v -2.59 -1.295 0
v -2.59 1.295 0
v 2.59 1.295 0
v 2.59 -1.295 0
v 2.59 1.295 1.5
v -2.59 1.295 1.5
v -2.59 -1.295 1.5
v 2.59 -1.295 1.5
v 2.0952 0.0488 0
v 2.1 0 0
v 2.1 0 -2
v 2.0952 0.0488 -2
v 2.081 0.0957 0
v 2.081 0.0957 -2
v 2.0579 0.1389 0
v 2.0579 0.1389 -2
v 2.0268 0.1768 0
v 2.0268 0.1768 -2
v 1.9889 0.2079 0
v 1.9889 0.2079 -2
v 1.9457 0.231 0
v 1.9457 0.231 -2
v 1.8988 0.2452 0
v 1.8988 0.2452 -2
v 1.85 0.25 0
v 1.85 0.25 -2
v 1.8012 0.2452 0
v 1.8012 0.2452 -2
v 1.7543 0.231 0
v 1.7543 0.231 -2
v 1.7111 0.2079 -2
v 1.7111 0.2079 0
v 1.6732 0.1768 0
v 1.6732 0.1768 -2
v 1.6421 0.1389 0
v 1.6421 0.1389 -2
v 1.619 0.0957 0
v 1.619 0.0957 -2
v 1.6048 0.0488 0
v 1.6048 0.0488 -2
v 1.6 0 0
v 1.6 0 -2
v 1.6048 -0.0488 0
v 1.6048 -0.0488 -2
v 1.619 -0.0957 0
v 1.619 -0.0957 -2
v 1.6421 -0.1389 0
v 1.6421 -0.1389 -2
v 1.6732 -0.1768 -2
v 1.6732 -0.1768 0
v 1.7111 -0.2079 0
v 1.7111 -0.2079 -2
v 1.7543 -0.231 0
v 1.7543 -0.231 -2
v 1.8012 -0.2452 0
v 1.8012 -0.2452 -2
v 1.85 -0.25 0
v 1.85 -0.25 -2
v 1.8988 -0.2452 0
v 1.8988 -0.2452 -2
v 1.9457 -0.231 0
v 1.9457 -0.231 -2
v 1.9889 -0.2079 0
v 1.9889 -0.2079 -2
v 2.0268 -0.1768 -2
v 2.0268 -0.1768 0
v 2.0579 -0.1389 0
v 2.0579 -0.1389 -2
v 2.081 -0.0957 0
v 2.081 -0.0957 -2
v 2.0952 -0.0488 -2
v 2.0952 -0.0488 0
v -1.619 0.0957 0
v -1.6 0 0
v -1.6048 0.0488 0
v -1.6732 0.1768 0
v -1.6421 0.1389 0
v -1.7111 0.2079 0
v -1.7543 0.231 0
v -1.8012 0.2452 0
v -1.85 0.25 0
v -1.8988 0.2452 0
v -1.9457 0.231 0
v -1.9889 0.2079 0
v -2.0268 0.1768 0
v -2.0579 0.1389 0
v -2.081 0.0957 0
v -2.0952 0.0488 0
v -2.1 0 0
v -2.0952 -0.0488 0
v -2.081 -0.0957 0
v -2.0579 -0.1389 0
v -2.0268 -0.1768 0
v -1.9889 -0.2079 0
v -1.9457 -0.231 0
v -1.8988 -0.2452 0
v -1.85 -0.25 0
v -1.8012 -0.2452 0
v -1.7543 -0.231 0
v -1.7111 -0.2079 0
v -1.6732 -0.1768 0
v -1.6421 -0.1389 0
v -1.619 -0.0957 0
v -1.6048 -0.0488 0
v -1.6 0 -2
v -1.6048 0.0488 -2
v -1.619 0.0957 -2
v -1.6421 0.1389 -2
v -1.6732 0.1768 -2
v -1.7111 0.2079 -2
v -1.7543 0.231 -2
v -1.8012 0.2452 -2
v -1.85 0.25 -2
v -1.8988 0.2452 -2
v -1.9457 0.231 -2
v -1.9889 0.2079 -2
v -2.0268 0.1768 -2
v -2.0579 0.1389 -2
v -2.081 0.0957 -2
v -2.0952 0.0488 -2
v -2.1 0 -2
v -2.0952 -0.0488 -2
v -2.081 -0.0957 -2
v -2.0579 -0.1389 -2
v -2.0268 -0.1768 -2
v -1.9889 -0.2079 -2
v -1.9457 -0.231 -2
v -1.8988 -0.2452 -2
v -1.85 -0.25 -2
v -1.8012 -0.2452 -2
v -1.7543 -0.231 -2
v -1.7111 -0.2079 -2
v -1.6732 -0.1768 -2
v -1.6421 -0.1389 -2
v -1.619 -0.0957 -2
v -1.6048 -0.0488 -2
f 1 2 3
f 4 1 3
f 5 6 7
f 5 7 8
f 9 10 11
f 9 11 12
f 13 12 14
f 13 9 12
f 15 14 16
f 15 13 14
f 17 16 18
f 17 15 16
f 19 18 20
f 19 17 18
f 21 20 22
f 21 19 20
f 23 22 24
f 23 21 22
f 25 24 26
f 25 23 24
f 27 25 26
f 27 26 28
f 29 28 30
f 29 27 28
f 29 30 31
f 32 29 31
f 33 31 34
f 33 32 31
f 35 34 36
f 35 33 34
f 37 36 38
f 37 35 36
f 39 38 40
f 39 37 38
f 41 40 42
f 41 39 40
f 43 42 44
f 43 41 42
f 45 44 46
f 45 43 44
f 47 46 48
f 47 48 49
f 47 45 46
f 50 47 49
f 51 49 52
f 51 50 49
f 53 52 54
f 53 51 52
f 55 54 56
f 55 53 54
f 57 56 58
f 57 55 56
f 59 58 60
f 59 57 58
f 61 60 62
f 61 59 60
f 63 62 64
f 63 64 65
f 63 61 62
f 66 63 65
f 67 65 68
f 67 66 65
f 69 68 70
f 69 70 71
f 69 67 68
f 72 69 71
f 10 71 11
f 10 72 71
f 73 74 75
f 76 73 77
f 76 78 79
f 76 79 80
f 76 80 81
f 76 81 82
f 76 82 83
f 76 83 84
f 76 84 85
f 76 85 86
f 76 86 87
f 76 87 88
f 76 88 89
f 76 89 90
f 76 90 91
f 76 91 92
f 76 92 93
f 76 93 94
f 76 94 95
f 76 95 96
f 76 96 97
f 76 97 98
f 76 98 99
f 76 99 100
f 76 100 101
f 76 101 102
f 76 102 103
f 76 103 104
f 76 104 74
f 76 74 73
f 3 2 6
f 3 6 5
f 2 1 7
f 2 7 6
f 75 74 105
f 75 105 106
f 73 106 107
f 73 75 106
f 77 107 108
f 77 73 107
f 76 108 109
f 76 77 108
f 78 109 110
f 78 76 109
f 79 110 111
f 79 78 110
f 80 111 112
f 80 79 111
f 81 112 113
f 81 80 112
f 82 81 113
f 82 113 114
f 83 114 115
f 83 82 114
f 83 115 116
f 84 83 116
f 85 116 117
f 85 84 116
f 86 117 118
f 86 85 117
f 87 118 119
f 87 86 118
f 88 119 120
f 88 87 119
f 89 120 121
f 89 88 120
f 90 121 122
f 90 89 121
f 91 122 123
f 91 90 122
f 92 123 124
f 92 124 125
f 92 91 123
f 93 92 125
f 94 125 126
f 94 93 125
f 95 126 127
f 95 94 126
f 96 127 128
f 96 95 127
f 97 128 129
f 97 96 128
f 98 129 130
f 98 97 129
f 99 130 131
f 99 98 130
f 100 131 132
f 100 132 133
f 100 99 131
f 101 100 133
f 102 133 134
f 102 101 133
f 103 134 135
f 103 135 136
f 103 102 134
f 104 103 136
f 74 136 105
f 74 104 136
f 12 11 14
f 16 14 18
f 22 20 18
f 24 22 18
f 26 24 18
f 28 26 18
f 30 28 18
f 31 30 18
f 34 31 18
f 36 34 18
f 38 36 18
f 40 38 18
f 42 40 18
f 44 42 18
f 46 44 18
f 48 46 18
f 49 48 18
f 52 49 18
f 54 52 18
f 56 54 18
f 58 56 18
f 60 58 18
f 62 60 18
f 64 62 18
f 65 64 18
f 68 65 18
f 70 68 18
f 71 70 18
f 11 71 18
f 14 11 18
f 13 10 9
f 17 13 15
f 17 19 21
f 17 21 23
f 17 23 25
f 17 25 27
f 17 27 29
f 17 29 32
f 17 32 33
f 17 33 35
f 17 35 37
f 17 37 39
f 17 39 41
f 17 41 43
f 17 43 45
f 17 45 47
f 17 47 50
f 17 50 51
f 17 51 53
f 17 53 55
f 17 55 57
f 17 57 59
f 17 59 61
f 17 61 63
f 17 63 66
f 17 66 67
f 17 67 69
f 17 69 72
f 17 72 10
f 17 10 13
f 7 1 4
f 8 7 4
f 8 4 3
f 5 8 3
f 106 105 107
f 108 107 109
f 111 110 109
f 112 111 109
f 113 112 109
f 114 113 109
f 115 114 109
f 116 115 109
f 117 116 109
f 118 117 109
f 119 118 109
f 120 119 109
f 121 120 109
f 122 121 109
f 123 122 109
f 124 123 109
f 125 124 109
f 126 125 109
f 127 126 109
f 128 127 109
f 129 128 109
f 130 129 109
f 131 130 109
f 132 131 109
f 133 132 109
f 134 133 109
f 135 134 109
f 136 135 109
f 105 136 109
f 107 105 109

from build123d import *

# Parameters (mm, degrees)
SKETCH1_W               = 5.18
SKETCH1_H               = 2.59
COMPONENT_OUTLINE_DEPTH = 1.5
SKETCH2_R               = 0.25
EXTRUDE_1_DEPTH         = 2
SKETCH3_R               = 0.25
EXTRUDE_2_DEPTH         = 2


with BuildPart() as part:
    # Sketch1 → Component_Outline (new body)
    with BuildSketch(Plane.XY):
        Rectangle(SKETCH1_W, SKETCH1_H)
    extrude(amount=COMPONENT_OUTLINE_DEPTH)


with BuildPart() as body_2:
    # Sketch2 → Extrude 1 (new body)
    with BuildSketch(Plane.XY):
        with Locations((-1.85, 0)):
            Circle(SKETCH2_R)
    extrude(amount=-EXTRUDE_1_DEPTH)


with BuildPart() as body_3:
    # Sketch3 → Extrude 2 (new body)
    with BuildSketch(Plane.XY):
        with Locations((1.85, 0)):
            Circle(SKETCH3_R)
    extrude(amount=-EXTRUDE_2_DEPTH)


solid = Compound([part.part, body_2.part, body_3.part])
